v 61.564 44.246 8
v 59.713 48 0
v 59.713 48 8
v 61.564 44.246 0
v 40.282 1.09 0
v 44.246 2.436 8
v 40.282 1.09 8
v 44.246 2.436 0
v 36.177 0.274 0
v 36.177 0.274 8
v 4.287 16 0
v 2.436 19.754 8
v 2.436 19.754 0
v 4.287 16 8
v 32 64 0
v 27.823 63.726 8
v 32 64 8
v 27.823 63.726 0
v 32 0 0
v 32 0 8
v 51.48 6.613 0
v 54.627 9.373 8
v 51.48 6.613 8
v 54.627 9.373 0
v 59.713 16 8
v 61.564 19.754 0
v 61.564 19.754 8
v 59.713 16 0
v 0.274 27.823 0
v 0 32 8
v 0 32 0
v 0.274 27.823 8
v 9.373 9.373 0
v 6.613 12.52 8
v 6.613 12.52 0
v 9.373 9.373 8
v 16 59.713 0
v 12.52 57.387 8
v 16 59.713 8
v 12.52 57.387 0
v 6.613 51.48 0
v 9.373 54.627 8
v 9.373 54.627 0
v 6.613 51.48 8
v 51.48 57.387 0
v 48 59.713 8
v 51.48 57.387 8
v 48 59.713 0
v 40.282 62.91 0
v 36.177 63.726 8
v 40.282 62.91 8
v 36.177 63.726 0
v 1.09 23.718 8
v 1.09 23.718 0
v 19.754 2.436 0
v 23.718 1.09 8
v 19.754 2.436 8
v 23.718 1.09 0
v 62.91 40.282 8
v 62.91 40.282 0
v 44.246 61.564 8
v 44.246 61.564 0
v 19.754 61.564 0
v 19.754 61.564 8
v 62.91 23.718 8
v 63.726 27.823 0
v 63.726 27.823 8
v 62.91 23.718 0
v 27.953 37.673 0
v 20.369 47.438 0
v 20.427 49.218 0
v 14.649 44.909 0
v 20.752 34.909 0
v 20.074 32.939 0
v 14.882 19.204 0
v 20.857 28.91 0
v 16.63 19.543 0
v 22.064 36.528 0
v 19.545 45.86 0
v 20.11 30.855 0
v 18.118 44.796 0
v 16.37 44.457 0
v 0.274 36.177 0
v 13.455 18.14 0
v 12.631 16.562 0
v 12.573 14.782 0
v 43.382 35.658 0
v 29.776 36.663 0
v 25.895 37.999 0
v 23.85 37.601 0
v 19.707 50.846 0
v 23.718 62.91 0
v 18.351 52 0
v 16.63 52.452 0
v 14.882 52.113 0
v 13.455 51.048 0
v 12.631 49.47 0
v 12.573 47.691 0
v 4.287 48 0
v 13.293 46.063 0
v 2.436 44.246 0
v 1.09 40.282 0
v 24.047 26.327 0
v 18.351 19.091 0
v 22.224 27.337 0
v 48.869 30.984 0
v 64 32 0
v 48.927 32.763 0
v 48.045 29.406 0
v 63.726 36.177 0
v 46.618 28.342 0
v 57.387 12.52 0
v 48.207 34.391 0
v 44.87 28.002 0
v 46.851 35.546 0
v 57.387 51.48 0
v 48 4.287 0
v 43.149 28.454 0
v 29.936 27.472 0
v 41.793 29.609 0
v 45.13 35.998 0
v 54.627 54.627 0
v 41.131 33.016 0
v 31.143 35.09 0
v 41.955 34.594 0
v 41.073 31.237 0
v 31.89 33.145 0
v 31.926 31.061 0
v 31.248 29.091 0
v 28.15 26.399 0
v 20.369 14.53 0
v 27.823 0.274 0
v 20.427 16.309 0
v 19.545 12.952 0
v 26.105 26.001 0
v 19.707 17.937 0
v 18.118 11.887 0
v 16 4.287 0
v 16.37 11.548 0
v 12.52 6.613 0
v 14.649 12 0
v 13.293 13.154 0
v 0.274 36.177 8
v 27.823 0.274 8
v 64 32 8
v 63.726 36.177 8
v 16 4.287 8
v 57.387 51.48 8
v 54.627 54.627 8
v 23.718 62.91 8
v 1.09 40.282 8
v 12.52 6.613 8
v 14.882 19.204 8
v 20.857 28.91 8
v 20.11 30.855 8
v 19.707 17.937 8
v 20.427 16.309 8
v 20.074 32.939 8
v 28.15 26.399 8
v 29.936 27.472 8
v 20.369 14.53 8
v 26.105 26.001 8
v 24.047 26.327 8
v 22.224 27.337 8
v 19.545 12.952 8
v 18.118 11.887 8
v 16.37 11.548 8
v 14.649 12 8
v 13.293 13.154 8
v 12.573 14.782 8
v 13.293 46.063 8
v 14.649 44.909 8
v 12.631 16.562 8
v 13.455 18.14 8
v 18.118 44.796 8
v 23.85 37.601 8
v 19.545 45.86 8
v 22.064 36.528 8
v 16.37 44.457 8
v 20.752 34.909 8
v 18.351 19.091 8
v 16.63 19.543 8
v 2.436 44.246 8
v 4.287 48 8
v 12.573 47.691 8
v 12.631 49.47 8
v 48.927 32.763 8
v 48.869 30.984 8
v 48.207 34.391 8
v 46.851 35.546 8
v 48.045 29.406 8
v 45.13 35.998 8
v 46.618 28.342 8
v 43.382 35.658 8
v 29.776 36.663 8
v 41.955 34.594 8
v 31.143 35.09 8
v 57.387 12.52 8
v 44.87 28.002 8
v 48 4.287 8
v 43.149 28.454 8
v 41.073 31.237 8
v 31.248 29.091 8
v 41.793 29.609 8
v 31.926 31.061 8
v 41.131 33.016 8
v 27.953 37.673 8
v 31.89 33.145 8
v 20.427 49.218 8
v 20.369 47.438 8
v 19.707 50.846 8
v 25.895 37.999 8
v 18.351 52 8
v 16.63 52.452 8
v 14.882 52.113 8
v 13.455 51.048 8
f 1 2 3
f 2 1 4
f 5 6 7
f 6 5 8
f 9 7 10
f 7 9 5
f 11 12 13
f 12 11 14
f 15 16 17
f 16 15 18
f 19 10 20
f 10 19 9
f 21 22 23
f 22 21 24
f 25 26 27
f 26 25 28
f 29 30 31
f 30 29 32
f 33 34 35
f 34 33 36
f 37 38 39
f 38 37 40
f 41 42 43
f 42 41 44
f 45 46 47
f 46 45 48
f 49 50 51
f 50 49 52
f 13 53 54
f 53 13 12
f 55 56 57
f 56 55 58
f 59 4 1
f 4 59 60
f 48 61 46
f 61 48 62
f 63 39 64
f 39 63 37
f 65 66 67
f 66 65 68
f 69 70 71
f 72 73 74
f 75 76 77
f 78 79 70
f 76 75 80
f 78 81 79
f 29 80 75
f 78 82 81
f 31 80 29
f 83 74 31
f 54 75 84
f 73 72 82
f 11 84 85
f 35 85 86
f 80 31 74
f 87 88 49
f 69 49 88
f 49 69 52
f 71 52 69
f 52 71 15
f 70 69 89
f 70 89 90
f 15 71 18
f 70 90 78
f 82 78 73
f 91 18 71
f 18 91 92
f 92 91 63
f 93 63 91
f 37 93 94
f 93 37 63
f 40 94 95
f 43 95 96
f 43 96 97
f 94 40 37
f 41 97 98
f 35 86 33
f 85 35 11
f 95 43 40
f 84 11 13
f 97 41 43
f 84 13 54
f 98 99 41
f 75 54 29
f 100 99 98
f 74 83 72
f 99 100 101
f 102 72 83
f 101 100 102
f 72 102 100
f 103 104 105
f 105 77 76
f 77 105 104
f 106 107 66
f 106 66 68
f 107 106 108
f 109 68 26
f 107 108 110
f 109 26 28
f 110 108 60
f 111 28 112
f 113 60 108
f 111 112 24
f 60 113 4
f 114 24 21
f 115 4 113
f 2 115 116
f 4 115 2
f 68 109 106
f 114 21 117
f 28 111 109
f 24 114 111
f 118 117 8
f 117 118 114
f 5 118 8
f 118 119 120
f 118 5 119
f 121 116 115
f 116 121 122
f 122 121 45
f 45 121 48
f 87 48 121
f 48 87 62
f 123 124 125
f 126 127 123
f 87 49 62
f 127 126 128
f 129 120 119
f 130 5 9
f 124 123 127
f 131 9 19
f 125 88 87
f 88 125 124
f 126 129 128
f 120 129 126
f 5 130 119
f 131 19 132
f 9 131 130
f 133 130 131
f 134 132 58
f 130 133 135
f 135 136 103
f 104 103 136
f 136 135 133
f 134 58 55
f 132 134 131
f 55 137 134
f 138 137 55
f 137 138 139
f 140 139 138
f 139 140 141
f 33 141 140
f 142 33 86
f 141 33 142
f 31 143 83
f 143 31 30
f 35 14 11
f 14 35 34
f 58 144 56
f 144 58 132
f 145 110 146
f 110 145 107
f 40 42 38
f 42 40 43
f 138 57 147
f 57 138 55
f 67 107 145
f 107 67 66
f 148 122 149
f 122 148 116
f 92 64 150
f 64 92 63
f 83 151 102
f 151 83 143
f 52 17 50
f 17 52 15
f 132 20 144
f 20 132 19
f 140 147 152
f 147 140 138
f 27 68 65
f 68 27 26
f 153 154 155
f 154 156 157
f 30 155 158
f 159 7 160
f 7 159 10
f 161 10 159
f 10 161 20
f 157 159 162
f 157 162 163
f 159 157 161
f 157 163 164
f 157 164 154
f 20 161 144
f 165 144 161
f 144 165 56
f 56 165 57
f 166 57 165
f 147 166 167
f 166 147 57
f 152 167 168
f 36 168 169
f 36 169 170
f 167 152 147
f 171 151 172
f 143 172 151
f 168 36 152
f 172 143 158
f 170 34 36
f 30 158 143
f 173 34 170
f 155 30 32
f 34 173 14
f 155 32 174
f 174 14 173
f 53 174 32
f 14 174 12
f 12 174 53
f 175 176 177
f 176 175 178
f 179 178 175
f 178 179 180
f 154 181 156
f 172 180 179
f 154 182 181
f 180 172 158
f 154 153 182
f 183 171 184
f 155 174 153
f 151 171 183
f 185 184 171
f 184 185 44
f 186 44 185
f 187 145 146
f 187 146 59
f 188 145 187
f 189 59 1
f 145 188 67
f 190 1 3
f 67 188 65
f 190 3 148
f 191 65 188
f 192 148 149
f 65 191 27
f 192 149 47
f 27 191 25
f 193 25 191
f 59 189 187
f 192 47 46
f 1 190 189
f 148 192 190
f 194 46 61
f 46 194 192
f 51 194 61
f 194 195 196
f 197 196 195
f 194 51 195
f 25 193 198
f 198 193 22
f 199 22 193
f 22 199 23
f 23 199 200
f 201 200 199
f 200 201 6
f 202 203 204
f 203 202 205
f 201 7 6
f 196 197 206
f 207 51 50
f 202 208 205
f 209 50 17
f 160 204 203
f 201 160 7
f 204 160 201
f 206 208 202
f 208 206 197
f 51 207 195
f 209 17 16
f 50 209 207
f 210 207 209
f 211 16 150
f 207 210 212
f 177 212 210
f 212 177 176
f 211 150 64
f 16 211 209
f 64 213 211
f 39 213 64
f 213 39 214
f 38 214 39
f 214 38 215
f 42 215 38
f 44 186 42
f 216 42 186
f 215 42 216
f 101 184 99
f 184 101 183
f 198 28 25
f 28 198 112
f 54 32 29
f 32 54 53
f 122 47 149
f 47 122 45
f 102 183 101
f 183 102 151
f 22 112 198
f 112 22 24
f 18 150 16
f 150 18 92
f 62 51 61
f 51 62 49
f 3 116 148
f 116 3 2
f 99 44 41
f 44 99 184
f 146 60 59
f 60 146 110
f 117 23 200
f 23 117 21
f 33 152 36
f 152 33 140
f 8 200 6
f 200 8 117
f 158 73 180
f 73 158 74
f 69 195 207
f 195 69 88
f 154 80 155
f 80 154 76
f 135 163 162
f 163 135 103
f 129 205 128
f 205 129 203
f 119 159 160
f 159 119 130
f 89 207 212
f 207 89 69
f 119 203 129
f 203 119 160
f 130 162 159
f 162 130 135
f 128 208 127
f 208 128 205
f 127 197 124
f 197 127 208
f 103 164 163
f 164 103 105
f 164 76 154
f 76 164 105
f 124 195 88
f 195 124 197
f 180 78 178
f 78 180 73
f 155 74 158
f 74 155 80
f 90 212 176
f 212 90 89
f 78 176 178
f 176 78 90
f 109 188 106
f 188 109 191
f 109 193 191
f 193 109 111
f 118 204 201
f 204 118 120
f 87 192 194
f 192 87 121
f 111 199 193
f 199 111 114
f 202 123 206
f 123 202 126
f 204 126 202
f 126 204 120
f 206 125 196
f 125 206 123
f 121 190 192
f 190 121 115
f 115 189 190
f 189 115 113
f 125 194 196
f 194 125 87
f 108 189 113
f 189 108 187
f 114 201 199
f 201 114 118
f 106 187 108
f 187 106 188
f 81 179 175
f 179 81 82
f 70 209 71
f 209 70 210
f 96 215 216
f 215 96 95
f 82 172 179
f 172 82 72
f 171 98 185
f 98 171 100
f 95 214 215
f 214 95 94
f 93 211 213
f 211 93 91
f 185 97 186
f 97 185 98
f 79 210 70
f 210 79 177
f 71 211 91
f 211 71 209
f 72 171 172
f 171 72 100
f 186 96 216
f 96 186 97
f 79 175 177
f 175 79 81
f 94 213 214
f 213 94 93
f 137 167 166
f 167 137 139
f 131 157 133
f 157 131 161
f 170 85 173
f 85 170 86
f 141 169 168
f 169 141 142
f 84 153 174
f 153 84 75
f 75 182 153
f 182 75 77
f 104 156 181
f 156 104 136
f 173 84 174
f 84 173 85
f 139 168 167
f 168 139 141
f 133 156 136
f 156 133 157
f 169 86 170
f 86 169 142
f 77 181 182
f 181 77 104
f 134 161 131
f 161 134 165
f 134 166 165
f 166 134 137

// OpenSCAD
$fn = 32;

// ----------------------------------------------------------------------
// Cam plate: eccentric cam, base R32
// ----------------------------------------------------------------------

// --- parameters (mm) ---
base_r = 32;              // base circle radius
lobe_h = 10;              // cam lobe rise
bore_r = 6;               // shaft bore radius
plate_t = 8;              // plate thickness, Z (extrusion height)
ecc = 6;                  // disc eccentricity
ring_r = 19;              // lightening ring radius
bolt_r = 4;               // lightening hole radius

profile = [[64, 32], [63.726, 36.177], [62.91, 40.282], [61.564, 44.246], [59.713, 48], [57.387, 51.48], [54.627, 54.627], [51.48, 57.387], [48, 59.713], [44.246, 61.564], [40.282, 62.91], [36.177, 63.726], [32, 64], [27.823, 63.726], [23.718, 62.91], [19.754, 61.564], [16, 59.713], [12.52, 57.387], [9.373, 54.627], [6.613, 51.48], [4.287, 48], [2.436, 44.246], [1.09, 40.282], [0.274, 36.177], [0, 32], [0.274, 27.823], [1.09, 23.718], [2.436, 19.754], [4.287, 16], [6.613, 12.52], [9.373, 9.373], [12.52, 6.613], [16, 4.287], [19.754, 2.436], [23.718, 1.09], [27.823, 0.274], [32, 0], [36.177, 0.274], [40.282, 1.09], [44.246, 2.436], [48, 4.287], [51.48, 6.613], [54.627, 9.373], [57.387, 12.52], [59.713, 16], [61.564, 19.754], [62.91, 23.718], [63.726, 27.823]];  // primary outline, 48 points, counter clockwise
void_1 = [[31.89, 33.145], [31.143, 35.09], [29.776, 36.663], [27.953, 37.673], [25.895, 37.999], [23.85, 37.601], [22.064, 36.528], [20.752, 34.909], [20.074, 32.939], [20.11, 30.855], [20.857, 28.91], [22.224, 27.337], [24.047, 26.327], [26.105, 26.001], [28.15, 26.399], [29.936, 27.472], [31.248, 29.091], [31.926, 31.061]];  // shaft bore, 18 points
void_2 = [[48.927, 32.763], [48.207, 34.391], [46.851, 35.546], [45.13, 35.998], [43.382, 35.658], [41.955, 34.594], [41.131, 33.016], [41.073, 31.237], [41.793, 29.609], [43.149, 28.454], [44.87, 28.002], [46.618, 28.342], [48.045, 29.406], [48.869, 30.984]];  // lightening hole 1, 14 points
void_3 = [[20.427, 49.218], [19.707, 50.846], [18.351, 52], [16.63, 52.452], [14.882, 52.113], [13.455, 51.048], [12.631, 49.47], [12.573, 47.691], [13.293, 46.063], [14.649, 44.909], [16.37, 44.457], [18.118, 44.796], [19.545, 45.86], [20.369, 47.438]];  // lightening hole 2, 14 points
void_4 = [[20.427, 16.309], [19.707, 17.937], [18.351, 19.091], [16.63, 19.543], [14.882, 19.204], [13.455, 18.14], [12.631, 16.562], [12.573, 14.782], [13.293, 13.154], [14.649, 12], [16.37, 11.548], [18.118, 11.887], [19.545, 12.952], [20.369, 14.53]];  // lightening hole 3, 14 points

// --- the one profile operation ---
difference() {
  linear_extrude(height = plate_t) polygon(points = profile);
  translate([0, 0, -1])
    linear_extrude(height = plate_t + 2) polygon(points = void_1);
  translate([0, 0, -1])
    linear_extrude(height = plate_t + 2) polygon(points = void_2);
  translate([0, 0, -1])
    linear_extrude(height = plate_t + 2) polygon(points = void_3);
  translate([0, 0, -1])
    linear_extrude(height = plate_t + 2) polygon(points = void_4);
}
